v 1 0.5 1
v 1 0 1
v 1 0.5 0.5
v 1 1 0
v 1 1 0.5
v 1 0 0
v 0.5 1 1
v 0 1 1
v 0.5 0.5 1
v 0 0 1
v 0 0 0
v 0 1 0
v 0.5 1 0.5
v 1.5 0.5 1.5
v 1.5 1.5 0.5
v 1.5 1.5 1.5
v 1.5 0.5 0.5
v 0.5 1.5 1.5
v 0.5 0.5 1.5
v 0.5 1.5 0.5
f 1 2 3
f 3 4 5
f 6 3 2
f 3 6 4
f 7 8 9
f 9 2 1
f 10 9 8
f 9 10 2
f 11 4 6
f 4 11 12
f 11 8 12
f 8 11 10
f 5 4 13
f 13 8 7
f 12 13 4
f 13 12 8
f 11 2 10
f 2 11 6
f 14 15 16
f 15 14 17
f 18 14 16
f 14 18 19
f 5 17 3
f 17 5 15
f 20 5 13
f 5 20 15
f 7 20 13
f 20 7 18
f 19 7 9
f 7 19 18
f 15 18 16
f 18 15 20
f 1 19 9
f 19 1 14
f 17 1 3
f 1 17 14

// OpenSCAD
// Brendan Fennell
// BF3DPrinting
// Abstracted Program

// Create A Meta Program To Generate Any Standard Name Tag


//Lettering Style
letter="Flush";//[Flush,Extruded, Negative]

//Style of Tag Perimeter
border="Bordered";//[Bordered,Clean]

//General Tag Shape
shape="Square";//[Square,Hanging,Bubble]

//Amount of Lean
lean="Nolean";//[Nolean,Lean]

//Lines of Text
lines="1 Line";//[1 Line,2 Lines,3 Lines]

//Side Differences?
side="Mirrored";//[Mirrored,Unique,Single Sided]

// Size
size="25mm";//[15mm,25mm,35mm]

// User Input
input="";

// Accents or Background
mode="accents";//[accents,background]


// Print To Screen
echo("");
echo("");
echo("");
echo("");

echo(str(letter,"-",border,"-","-",shape,"-",lean,"-",lines,"-",side,"-",size,"-",mode));
echo(PN);

echo("");
echo("");
echo("");
echo("");

// Geometry
cube(1);
if(letter[0]=="F"){
translate([.5,.5,.5])
cube(1);
}



// Compress inputs into a part number
PN=str(letter[0],border[0],shape[0],lean[0],lines[0],side[0],"-",size[0],size[1],mode[0]);

// Process Variables
hlay=.2;//200 micron
wnoz=.4;//400 micron

// Tag Dimensions in mm
wtag=(ord(size[0])-48)*10+ord(size[1])-48;
htag=5;//Five millimeters Height
htex=wtag*.6;// 60% Tag Width
hlet=8*hlay;//Letters Ten Layers Thick
tstrip=hlet;//Border Same As Letters
rout=wtag/2;//Corner Radius
rhole=3;//Hole Size


// Incremental Value
bit=.001;//1 micron "nudge"
